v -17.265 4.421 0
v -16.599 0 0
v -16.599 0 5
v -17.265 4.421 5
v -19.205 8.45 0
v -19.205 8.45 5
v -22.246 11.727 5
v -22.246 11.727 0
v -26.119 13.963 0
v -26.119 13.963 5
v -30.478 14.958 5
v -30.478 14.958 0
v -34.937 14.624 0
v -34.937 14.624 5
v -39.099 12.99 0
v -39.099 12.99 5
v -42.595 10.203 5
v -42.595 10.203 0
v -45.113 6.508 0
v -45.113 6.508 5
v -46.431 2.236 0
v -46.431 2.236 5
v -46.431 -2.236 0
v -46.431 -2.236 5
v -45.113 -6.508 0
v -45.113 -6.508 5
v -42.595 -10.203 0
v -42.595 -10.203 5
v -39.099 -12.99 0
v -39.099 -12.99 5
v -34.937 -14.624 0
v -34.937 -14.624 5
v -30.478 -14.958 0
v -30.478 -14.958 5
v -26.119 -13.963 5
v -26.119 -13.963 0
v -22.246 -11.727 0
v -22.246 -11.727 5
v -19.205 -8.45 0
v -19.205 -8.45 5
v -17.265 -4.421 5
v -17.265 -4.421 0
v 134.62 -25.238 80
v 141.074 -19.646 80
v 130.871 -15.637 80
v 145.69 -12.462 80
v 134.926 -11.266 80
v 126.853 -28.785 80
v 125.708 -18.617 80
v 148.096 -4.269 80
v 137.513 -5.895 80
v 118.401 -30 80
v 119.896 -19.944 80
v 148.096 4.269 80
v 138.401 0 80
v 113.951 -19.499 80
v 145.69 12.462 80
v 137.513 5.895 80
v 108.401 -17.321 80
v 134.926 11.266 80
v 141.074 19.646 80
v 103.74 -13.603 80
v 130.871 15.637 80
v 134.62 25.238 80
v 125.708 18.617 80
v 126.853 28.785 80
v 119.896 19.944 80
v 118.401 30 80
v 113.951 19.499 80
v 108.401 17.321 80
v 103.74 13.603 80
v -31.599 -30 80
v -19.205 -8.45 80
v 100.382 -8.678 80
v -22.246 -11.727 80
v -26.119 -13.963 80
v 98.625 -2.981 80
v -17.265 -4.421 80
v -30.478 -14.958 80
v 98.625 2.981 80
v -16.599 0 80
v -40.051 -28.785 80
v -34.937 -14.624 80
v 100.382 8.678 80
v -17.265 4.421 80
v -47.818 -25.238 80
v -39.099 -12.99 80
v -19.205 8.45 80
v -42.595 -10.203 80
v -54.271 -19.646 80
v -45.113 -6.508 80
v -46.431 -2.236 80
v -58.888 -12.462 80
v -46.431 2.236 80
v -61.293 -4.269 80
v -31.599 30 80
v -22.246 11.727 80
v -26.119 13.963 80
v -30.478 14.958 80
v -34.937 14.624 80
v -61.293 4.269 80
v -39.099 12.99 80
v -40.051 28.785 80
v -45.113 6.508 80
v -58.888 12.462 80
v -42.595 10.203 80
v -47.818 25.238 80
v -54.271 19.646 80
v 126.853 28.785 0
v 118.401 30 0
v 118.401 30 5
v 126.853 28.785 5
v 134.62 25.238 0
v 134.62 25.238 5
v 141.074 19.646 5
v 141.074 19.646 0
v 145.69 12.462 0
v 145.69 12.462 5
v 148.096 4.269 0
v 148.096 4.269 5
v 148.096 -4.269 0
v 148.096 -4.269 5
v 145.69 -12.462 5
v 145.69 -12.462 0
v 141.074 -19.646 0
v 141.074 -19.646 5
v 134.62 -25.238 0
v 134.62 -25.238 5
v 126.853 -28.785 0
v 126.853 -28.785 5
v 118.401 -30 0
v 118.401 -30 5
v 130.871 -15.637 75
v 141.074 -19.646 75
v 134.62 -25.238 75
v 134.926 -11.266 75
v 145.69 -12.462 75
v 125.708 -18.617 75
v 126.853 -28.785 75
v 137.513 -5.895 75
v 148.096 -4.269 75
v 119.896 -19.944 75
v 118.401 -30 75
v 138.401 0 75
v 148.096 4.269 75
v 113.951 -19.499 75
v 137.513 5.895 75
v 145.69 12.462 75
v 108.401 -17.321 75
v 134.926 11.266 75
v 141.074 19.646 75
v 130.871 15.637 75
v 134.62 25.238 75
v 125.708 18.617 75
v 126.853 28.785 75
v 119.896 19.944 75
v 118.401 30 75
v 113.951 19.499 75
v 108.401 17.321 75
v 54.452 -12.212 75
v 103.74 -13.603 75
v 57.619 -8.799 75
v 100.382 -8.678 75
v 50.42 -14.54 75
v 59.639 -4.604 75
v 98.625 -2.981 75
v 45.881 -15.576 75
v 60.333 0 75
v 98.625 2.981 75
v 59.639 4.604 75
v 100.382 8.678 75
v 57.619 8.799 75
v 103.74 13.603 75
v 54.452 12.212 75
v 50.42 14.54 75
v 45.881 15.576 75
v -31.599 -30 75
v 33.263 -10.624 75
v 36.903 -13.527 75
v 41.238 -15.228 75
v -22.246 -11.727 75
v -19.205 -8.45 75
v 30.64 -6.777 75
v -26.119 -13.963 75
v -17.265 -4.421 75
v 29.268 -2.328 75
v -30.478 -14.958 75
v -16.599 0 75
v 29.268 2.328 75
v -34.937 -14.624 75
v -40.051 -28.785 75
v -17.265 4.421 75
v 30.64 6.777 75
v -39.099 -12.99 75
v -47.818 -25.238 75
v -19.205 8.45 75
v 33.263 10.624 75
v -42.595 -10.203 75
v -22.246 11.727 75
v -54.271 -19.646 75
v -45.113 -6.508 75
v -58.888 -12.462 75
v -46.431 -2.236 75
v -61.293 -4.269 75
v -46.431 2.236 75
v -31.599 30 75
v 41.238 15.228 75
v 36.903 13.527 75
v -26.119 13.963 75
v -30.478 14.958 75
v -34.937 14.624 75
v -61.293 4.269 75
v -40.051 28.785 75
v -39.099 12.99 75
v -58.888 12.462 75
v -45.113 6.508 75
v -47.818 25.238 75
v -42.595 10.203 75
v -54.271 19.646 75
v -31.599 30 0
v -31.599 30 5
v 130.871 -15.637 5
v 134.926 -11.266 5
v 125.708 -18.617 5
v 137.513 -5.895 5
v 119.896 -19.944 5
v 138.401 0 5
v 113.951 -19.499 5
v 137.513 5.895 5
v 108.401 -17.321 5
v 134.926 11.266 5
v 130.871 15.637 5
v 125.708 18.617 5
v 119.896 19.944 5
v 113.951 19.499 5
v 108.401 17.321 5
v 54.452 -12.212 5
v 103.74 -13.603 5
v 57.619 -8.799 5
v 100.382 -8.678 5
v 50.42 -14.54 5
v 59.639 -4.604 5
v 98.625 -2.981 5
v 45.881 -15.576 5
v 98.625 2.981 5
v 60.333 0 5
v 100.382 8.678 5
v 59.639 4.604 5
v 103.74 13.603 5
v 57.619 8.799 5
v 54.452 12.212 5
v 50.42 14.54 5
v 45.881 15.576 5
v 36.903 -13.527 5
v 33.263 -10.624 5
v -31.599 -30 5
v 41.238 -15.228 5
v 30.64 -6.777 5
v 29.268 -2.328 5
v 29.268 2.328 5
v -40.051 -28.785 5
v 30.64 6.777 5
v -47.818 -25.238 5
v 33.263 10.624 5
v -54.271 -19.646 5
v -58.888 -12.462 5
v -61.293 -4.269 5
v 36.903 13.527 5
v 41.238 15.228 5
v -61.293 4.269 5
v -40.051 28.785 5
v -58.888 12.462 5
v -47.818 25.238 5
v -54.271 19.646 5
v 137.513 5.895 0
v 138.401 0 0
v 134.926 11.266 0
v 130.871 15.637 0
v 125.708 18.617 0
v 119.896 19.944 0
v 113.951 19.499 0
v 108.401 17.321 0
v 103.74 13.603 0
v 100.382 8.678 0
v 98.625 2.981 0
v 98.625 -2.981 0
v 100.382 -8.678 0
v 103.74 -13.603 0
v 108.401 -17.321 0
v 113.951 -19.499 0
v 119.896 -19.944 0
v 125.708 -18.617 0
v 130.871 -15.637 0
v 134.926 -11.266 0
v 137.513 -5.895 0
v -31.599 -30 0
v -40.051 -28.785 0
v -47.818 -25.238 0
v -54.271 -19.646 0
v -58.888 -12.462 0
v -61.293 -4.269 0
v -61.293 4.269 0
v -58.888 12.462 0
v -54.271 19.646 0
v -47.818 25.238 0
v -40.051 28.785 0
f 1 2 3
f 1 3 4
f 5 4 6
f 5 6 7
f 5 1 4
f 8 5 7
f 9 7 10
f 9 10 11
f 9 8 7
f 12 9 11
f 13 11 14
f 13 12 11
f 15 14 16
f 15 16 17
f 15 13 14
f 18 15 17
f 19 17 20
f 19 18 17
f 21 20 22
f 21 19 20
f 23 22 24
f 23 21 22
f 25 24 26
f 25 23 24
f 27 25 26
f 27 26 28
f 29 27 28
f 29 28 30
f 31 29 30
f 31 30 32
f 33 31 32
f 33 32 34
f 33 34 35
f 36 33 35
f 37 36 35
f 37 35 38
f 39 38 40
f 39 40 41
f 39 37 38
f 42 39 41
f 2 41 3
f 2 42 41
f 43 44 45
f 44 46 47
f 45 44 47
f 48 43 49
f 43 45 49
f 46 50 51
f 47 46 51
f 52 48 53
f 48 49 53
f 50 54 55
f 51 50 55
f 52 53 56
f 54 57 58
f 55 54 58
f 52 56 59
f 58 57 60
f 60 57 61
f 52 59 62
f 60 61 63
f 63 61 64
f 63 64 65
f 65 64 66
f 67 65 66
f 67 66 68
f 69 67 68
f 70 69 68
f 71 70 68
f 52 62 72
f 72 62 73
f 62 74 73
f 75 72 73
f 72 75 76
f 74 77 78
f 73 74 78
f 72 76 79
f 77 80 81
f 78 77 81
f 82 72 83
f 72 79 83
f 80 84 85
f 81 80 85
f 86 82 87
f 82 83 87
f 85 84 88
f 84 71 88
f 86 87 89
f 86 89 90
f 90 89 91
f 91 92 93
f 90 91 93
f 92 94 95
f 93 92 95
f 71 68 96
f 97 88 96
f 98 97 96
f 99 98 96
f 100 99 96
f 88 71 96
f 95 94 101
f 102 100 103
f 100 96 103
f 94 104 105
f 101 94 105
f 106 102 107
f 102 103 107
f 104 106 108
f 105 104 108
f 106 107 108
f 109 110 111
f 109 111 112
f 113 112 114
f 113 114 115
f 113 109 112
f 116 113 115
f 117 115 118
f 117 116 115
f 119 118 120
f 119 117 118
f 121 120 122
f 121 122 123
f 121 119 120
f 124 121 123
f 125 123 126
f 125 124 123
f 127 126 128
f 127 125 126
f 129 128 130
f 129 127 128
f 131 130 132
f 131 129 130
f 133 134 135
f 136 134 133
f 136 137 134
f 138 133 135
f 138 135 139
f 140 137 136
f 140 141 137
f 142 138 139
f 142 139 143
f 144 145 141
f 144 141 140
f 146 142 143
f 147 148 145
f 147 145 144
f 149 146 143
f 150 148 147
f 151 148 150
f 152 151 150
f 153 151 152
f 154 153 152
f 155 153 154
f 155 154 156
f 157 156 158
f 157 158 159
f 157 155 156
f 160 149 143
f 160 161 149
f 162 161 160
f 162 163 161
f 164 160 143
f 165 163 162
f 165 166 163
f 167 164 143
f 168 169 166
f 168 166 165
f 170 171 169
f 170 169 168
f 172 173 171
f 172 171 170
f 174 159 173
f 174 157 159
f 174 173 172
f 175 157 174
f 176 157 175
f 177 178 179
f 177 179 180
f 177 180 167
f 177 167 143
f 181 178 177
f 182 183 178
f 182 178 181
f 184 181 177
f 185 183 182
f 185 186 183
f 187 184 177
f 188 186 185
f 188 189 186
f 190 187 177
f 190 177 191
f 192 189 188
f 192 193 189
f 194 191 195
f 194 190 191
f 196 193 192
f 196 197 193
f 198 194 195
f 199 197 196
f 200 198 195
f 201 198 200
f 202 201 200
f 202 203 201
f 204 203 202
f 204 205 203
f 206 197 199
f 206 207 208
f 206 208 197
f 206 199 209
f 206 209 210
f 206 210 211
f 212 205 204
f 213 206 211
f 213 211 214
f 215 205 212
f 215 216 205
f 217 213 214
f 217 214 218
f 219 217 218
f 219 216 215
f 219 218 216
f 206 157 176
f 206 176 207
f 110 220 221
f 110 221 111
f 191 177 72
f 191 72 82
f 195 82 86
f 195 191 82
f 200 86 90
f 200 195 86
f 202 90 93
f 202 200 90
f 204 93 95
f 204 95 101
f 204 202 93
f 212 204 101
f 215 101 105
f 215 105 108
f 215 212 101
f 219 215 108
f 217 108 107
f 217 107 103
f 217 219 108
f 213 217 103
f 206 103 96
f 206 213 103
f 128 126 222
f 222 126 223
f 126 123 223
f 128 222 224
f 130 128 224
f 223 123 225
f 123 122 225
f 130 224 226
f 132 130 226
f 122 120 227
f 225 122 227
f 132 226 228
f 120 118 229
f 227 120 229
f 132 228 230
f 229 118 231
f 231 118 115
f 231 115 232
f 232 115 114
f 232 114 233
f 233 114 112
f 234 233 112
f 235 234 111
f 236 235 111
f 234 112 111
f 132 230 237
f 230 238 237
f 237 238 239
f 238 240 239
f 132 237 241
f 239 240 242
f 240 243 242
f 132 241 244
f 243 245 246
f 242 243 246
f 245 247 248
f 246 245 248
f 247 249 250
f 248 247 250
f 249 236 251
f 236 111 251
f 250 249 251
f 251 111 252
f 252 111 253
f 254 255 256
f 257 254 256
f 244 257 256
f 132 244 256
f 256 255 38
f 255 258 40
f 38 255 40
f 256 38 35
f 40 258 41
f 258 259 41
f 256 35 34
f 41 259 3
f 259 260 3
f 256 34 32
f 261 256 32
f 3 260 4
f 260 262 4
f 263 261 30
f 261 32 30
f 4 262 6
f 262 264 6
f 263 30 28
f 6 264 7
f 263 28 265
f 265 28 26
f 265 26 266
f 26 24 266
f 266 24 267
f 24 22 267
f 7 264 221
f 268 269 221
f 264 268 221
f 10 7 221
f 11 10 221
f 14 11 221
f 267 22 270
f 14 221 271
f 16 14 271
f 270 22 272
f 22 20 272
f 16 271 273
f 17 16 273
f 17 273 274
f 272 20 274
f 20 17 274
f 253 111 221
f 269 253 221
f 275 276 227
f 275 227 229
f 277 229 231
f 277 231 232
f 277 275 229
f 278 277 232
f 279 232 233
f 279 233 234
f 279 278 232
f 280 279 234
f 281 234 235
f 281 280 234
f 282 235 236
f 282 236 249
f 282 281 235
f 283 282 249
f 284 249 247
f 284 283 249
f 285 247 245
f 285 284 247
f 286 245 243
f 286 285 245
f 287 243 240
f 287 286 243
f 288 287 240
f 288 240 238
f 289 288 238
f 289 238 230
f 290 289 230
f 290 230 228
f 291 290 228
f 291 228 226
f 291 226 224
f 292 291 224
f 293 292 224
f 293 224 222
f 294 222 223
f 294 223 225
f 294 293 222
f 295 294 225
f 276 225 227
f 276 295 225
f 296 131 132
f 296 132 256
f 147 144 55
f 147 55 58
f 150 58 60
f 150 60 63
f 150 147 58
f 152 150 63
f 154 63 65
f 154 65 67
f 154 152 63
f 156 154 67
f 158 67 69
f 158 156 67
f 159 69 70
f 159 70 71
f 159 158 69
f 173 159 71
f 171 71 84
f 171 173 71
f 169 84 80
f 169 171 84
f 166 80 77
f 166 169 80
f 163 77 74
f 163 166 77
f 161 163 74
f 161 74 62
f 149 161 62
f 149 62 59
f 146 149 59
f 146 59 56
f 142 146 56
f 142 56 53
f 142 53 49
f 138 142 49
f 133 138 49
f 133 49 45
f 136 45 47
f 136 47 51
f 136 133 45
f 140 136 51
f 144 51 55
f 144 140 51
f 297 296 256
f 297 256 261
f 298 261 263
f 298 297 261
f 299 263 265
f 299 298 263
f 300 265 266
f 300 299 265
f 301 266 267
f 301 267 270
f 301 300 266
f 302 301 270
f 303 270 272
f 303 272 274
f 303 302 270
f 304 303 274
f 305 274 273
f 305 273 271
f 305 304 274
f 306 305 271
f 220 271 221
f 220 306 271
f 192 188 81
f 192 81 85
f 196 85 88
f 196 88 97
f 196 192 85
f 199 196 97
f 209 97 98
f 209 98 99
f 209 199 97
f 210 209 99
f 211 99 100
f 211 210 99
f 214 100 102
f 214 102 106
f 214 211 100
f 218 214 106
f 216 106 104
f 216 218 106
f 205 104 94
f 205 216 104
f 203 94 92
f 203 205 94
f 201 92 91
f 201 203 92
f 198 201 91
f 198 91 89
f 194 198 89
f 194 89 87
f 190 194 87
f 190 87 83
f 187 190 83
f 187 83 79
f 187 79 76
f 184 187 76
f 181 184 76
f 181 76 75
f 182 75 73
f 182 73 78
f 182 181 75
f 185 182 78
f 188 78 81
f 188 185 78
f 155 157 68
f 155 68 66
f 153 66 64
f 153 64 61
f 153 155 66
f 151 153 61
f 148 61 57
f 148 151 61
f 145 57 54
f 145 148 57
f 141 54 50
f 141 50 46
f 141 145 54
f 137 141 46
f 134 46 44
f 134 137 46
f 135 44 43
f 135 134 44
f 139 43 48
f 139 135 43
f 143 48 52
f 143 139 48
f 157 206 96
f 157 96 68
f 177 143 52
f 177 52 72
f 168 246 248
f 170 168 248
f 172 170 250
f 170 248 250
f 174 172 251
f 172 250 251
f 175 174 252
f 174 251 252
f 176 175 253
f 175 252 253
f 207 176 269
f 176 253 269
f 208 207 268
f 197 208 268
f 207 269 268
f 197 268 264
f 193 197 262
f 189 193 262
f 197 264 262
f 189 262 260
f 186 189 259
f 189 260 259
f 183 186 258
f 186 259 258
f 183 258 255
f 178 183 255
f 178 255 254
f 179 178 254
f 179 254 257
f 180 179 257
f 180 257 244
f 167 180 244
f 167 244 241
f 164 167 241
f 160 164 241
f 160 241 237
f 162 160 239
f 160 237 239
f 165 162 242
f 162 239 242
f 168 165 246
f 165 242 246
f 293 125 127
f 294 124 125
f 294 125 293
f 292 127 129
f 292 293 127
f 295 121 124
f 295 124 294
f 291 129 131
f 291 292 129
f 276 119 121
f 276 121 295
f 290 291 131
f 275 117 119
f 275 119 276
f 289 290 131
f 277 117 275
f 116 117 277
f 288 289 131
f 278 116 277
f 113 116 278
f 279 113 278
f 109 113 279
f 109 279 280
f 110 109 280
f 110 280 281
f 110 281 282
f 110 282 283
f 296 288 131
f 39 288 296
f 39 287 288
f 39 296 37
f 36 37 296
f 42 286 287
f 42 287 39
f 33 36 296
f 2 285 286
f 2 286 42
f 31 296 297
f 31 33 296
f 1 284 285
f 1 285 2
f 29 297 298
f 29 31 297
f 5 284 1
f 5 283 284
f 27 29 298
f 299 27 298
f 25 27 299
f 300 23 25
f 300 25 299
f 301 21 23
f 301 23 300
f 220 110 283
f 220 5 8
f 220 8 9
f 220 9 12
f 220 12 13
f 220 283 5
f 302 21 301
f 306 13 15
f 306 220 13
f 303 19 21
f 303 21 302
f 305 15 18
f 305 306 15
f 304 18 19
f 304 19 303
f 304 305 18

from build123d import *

# Parameters (mm, degrees)
SKETCH_1_R             = 15
SKETCH_1_R_2           = 20
EXTRUDE_1_DEPTH        = 5
SKETCH_2_R             = 15.619945806
EXTRUDE_2_DEPTH        = 70
PATTERN_LINEAR_1_COUNT = 2
PATTERN_LINEAR_1_PITCH = 75


with BuildPart() as part:
    # 草图1 → 凸台-拉伸1 (new body)
    with BuildSketch(Plane.XY):
        with BuildLine():
            Line((-31.598747919, 30), (118.401252081, 30))
            ThreePointArc((118.401252081, 30), (148.401252081, 0), (118.401252081, -30))
            Line((118.401252081, -30), (-31.598747919, -30))
            ThreePointArc((-31.598747919, -30), (-61.598747919, 0), (-31.598747919, 30))
        make_face()
        with Locations((-31.598747919, 0)):
            Circle(SKETCH_1_R, mode=Mode.SUBTRACT)
        with Locations((118.401252081, 0)):
            Circle(SKETCH_1_R_2, mode=Mode.SUBTRACT)
    extrude_1 = extrude(amount=EXTRUDE_1_DEPTH)

    # 草图2 → 凸台-拉伸2 (add)
    with BuildSketch(Plane.XY.offset(5)):
        with Locations((44.713404219, 0)):
            Circle(SKETCH_2_R)
    extrude(amount=EXTRUDE_2_DEPTH)

    # 阵列(线性)1: 凸台-拉伸1 ×2
    with Locations(*[(0, 0, i * PATTERN_LINEAR_1_PITCH) for i in range(1, PATTERN_LINEAR_1_COUNT)]):
        add(extrude_1)


solid = part.part
